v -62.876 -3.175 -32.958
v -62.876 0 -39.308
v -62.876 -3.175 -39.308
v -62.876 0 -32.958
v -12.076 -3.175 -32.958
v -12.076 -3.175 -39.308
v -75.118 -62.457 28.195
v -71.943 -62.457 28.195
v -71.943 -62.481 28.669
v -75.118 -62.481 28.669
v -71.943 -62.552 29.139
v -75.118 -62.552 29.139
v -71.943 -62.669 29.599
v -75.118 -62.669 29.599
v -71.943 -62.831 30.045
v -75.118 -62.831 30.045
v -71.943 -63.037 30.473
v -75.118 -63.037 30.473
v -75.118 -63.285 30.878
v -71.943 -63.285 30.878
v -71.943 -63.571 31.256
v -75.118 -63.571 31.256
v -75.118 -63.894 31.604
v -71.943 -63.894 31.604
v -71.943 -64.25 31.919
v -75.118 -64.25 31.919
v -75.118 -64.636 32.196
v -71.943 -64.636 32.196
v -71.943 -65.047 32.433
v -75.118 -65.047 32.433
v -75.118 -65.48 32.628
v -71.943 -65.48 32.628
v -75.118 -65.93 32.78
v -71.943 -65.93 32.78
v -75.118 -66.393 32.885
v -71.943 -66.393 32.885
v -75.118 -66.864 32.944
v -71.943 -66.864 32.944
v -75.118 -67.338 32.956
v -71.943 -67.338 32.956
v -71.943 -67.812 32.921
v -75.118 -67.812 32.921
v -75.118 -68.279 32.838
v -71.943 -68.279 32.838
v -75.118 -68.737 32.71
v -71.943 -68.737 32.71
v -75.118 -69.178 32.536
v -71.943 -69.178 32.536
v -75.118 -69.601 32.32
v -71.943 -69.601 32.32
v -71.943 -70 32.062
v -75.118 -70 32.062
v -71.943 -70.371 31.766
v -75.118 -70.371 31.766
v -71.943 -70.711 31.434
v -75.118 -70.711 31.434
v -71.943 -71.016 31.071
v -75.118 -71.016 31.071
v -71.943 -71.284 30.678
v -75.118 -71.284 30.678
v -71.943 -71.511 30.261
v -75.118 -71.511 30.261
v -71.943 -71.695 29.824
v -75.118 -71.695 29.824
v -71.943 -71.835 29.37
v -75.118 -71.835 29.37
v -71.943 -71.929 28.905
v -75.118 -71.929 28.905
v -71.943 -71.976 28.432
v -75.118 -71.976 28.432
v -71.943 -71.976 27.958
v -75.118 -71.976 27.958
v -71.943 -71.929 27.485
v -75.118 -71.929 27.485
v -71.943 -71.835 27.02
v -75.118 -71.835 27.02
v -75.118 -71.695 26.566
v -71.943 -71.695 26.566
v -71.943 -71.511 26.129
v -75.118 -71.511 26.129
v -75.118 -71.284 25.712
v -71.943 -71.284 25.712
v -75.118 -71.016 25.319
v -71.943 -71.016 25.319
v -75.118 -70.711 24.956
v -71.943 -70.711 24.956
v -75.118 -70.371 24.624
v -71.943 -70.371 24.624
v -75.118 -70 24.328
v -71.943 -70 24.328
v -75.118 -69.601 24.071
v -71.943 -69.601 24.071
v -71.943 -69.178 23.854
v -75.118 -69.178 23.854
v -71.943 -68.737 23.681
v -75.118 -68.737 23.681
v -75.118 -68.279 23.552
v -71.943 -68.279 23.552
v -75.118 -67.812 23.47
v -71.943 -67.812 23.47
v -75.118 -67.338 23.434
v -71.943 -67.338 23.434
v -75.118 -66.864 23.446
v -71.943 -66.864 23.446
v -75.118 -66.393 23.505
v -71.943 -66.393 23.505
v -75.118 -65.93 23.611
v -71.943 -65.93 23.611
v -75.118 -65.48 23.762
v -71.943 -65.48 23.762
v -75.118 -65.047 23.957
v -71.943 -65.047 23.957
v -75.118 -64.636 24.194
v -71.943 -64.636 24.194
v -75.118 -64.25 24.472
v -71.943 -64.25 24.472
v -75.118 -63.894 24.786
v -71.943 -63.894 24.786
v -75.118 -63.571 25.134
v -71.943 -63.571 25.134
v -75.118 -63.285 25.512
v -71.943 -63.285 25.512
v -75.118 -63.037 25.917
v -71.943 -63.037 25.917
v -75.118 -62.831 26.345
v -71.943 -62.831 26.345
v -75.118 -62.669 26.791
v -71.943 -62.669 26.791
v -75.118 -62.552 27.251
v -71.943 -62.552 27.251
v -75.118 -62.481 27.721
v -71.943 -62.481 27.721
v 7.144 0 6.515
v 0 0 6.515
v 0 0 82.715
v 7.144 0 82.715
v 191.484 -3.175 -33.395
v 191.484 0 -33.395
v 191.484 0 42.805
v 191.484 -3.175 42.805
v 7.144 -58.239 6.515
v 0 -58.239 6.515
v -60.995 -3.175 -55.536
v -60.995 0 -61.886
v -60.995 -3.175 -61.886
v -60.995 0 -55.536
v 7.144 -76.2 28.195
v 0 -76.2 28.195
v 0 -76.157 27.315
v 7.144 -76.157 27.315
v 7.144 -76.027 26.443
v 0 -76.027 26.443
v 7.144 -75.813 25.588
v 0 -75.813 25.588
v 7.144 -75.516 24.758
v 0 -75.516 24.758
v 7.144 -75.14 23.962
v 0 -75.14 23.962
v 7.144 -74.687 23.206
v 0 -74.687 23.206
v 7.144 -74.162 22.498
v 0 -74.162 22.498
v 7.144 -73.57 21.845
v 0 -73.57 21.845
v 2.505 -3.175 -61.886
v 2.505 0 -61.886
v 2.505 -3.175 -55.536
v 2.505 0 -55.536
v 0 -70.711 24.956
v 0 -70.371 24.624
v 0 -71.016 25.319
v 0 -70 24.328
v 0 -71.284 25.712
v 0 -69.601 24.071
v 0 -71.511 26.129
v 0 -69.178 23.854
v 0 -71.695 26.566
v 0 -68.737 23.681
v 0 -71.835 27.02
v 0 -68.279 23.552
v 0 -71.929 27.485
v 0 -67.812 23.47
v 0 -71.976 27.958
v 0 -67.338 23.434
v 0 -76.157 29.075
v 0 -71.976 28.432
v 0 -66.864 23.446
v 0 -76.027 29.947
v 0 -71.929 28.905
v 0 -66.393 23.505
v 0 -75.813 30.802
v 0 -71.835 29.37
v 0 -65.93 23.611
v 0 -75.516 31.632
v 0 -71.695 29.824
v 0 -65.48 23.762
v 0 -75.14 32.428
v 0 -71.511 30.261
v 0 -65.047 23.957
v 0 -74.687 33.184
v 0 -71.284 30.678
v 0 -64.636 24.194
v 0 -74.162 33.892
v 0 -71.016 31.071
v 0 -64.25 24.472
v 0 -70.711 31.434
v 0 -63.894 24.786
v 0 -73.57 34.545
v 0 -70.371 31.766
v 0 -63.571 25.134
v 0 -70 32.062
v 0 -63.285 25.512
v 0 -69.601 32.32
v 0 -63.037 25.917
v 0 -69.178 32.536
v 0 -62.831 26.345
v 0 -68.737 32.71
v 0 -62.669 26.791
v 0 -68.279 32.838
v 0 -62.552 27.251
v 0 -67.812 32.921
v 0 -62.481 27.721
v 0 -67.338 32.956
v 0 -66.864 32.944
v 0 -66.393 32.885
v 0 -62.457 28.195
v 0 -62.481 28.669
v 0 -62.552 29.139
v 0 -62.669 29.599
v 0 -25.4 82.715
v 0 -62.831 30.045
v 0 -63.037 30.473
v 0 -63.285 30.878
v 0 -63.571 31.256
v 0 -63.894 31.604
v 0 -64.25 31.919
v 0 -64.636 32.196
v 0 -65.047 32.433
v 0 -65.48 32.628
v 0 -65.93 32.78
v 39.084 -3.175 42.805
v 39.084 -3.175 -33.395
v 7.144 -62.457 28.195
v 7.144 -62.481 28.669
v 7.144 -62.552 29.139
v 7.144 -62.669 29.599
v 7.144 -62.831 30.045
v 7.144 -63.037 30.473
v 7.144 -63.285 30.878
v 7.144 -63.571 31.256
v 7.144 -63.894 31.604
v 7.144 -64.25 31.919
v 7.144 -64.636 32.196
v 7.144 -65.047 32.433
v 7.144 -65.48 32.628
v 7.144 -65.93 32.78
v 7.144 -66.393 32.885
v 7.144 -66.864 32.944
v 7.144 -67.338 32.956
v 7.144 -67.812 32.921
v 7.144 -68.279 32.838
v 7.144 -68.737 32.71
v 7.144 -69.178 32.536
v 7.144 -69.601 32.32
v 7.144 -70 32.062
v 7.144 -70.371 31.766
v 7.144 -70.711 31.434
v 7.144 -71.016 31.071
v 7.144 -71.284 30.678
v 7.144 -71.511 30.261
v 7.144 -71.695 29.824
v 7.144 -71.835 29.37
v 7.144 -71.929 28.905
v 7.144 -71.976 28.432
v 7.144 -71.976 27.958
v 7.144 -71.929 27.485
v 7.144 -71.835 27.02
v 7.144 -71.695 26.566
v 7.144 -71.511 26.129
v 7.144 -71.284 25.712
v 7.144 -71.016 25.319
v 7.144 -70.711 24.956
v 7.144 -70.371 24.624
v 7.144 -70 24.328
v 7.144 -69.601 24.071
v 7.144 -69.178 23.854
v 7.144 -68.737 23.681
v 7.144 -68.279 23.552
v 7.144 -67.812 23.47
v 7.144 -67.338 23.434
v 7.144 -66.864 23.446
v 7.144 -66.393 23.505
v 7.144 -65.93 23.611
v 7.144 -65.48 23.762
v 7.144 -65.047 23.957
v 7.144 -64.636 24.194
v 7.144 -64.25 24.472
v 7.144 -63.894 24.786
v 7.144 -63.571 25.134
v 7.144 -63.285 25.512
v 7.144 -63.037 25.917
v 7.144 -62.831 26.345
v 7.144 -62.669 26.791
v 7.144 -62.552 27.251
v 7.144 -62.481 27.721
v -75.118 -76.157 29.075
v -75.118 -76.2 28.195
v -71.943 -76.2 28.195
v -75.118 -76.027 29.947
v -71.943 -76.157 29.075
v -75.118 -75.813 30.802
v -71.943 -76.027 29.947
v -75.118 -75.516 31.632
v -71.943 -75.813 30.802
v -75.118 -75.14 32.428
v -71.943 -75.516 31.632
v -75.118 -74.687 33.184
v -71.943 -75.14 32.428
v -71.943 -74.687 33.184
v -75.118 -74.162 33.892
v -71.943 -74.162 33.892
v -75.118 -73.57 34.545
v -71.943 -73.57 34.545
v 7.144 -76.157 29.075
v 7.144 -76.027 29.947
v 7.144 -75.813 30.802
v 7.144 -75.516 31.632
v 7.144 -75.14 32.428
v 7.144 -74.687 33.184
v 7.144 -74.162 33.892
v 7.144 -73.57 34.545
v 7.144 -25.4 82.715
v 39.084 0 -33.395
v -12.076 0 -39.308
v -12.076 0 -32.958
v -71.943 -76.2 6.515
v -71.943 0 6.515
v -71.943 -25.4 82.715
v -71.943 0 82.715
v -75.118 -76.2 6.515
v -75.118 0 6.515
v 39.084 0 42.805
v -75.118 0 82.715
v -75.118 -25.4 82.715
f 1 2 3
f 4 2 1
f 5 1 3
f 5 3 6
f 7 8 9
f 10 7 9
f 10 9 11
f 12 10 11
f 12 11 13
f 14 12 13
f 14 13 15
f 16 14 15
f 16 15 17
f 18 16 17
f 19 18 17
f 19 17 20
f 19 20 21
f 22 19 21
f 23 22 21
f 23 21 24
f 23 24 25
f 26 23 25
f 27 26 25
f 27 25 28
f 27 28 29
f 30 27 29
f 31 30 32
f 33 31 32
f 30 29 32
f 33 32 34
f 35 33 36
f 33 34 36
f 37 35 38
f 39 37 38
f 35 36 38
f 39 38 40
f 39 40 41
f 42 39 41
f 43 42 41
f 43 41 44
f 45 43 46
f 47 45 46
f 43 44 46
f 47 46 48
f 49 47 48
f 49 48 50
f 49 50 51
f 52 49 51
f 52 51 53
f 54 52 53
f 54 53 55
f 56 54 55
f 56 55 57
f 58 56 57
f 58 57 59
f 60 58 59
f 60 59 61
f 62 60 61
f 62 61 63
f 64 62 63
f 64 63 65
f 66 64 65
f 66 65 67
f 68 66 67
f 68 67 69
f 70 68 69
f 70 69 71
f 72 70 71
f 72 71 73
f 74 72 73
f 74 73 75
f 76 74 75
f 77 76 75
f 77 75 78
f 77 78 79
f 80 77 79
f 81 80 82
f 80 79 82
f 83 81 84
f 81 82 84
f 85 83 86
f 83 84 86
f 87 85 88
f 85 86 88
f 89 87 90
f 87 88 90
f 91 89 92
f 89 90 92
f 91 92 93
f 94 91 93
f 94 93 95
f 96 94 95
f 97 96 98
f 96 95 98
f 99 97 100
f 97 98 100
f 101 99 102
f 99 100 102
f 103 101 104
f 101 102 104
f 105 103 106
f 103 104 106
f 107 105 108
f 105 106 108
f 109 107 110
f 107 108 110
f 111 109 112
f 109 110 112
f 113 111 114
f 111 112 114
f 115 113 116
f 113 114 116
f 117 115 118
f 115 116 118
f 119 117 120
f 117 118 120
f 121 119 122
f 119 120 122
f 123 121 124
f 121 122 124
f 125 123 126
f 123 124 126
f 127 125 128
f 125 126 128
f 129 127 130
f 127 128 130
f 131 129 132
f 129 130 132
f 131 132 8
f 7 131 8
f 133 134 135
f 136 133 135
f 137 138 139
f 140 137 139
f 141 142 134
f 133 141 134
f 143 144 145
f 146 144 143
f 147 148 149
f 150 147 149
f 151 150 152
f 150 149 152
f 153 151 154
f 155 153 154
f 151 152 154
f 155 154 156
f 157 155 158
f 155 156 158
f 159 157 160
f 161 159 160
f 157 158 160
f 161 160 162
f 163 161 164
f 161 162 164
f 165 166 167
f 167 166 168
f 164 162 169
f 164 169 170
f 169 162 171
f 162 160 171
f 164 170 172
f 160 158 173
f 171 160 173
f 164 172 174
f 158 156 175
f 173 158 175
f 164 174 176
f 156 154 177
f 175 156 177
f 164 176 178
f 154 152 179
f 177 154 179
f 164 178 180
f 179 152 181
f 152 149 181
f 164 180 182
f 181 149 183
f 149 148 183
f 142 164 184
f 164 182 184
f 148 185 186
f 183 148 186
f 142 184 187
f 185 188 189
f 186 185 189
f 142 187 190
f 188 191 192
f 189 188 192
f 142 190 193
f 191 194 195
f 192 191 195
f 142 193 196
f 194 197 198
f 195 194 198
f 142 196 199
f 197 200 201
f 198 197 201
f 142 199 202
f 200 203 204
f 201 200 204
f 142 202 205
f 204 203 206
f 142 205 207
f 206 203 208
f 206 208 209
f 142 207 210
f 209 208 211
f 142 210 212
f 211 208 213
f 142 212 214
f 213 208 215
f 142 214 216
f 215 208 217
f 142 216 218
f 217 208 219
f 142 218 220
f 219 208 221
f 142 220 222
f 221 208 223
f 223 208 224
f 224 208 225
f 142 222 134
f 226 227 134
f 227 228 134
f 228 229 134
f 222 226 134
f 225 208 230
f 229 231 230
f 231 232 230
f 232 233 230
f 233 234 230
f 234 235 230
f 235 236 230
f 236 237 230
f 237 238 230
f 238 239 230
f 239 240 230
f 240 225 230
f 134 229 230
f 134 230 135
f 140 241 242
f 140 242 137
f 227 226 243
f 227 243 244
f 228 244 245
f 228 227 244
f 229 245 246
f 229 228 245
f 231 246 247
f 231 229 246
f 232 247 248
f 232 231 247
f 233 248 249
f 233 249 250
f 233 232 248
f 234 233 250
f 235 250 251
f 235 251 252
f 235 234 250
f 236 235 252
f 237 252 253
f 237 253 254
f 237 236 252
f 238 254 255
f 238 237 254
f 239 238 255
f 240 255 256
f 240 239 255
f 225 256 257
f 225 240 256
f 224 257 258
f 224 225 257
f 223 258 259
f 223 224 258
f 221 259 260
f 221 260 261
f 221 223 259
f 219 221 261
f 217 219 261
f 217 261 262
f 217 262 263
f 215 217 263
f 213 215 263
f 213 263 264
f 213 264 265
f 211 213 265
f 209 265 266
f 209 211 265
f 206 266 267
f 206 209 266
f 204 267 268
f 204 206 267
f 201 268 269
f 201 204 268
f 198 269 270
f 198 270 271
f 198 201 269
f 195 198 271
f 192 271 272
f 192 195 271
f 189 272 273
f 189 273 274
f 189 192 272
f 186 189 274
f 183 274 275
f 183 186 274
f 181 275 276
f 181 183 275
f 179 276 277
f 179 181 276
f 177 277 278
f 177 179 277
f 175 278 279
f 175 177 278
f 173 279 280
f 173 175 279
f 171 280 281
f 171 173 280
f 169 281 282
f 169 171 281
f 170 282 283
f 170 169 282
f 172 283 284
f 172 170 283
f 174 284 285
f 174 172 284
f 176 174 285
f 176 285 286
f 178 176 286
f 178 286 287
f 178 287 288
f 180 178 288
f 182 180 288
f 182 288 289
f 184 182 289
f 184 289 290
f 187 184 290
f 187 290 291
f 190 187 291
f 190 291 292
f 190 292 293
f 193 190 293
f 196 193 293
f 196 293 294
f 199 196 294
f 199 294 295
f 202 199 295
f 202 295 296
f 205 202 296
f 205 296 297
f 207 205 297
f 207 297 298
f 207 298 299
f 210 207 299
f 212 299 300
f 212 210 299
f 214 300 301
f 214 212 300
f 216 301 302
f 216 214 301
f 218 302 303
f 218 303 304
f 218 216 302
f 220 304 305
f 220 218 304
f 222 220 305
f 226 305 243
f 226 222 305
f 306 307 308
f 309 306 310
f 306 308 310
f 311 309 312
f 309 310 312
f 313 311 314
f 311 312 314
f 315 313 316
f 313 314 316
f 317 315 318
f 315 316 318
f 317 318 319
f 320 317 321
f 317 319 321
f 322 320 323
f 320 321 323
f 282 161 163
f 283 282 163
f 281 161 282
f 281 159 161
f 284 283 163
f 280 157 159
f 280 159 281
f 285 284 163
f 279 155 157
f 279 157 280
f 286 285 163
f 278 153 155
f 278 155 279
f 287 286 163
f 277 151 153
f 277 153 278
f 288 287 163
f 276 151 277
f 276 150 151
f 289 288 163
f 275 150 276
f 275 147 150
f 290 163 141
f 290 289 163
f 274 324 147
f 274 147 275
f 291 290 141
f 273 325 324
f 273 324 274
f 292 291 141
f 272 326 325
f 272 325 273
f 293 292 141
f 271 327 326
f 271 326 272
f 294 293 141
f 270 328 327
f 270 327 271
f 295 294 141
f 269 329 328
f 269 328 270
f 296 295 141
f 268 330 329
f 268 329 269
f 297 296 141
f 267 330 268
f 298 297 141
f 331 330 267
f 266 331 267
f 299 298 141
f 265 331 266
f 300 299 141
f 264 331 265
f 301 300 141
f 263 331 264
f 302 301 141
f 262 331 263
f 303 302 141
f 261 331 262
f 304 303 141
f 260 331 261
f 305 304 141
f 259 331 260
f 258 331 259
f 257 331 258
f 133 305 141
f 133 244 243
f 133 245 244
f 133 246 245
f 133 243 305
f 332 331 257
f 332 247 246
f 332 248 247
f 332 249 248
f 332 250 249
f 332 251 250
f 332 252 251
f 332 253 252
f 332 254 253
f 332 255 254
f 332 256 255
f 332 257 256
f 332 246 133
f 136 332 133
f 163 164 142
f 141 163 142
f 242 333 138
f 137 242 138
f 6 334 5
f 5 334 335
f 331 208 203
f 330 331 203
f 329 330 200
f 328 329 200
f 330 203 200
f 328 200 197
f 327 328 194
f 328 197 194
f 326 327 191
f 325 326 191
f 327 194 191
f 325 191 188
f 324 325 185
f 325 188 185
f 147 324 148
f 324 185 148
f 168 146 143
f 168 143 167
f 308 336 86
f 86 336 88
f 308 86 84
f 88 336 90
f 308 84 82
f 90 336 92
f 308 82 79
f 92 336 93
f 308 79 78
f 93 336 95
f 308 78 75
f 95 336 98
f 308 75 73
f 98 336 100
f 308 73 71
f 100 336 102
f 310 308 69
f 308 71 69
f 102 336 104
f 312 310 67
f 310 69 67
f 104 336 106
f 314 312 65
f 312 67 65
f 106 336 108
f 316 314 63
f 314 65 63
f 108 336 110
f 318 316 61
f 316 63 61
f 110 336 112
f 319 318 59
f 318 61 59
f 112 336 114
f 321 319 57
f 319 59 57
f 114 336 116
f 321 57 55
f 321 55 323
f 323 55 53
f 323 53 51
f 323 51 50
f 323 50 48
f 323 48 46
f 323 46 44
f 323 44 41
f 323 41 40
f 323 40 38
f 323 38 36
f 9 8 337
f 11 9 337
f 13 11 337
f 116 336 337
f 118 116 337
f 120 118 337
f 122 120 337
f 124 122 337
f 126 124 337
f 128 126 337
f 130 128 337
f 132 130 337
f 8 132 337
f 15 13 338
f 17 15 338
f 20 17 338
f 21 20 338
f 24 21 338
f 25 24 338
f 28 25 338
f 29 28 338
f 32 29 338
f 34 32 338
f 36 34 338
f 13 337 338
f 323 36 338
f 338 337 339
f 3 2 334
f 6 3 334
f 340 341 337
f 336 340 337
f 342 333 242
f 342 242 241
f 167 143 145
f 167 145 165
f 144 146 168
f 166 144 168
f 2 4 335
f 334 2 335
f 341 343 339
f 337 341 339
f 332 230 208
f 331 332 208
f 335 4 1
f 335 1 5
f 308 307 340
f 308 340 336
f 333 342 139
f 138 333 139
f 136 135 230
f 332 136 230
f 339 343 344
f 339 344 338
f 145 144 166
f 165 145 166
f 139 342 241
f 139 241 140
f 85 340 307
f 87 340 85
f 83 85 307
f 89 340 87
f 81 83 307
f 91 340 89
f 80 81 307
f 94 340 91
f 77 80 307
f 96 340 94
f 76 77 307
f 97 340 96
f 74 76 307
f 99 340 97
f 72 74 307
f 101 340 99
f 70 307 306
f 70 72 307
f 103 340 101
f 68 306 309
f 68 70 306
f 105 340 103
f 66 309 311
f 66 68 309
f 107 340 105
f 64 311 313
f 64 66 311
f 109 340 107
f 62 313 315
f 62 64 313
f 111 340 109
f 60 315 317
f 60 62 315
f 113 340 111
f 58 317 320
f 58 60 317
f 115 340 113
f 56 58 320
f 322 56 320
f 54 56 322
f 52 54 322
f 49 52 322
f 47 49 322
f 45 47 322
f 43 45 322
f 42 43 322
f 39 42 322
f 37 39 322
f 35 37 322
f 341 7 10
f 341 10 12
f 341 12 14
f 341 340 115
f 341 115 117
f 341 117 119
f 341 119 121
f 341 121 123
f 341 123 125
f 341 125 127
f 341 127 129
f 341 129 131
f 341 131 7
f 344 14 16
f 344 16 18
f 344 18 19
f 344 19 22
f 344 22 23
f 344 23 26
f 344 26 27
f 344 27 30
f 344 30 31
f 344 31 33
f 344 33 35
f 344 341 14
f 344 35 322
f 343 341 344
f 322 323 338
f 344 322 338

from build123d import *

# Parameters (mm, degrees)
F0_W     = 3.175
F0_H     = 76.2
F1_DEPTH = 76.2
F2_R     = 4.7625
F3_DEPTH = 3.176
F4_R     = 4.7625
F5_DEPTH = 7.14375
F6_W     = 50.8
F6_H     = 6.35
F7_DEPTH = 3.175
F6_W_2   = 63.5
F8_W     = 152.4
F8_H     = 76.2
F9_DEPTH = 3.175


with BuildPart() as f1:
    # F0 (on Front) → F1 (new body)
    with BuildSketch(Plane.XZ):
        with Locations((-73.5300647497, 44.6148249376)):
            Rectangle(F0_W, F0_H)
    extrude(amount=F1_DEPTH)

    # F2 (on face) → F3 (cut, through all)
    with BuildSketch(Plane.YZ.offset(-71.9425647497)):
        with Locations((-67.2197438789, 28.1950810586)):
            Circle(F2_R)
        Polygon((-25.4, 82.7148249376), (-76.2, 82.7148249376), (-76.2, 31.9148249376), (-73.5697438639, 34.5450810737), align=None)
        with BuildLine():
            Line((-73.5697438639, 34.5450810737), (-76.2, 31.9148249376))
            Line((-76.2, 31.9148249376), (-76.2, 28.1950810586))
            ThreePointArc((-76.2, 28.1950810586), (-75.5164187018, 31.6316763044), (-73.5697438639, 34.5450810737))
        make_face()
    extrude(amount=-F3_DEPTH, mode=Mode.SUBTRACT)


with BuildPart() as f5:
    # F4 (on Right) → F5 (new body)
    with BuildSketch(Plane.YZ):
        with BuildLine():
            Line((-25.4, 82.7148249376), (-73.5697438789, 34.5450810586))
            ThreePointArc((-73.5697438789, 34.5450810586), (-63.783148643, 36.4917558856), (-58.2394877579, 28.1950810586))
            ThreePointArc((-58.2394877579, 28.1950810586), (-63.783148643, 19.8984062317), (-73.5697438789, 21.8450810586))
            Line((-73.5697438789, 21.8450810586), (-58.2394877579, 6.5148249376))
            Line((-58.2394877579, 6.5148249376), (0, 6.5148249376))
            Line((0, 6.5148249376), (0, 82.7148249376))
            Line((0, 82.7148249376), (-25.4, 82.7148249376))
        make_face()
        with BuildLine():
            ThreePointArc((-58.2394877579, 28.1950810586), (-63.783148643, 36.4917558856), (-73.5697438789, 34.5450810586))
            ThreePointArc((-73.5697438789, 34.5450810586), (-75.5164187059, 31.6316762946), (-76.2, 28.1950810586))
            ThreePointArc((-76.2, 28.1950810586), (-75.5164187059, 24.7584858227), (-73.5697438789, 21.8450810586))
            ThreePointArc((-73.5697438789, 21.8450810586), (-63.783148643, 19.8984062317), (-58.2394877579, 28.1950810586))
        make_face()
        with Locations((-67.2197438789, 28.1950810586)):
            Circle(F4_R, mode=Mode.SUBTRACT)
    extrude(amount=F5_DEPTH)


with BuildPart() as f7:
    # F6 (on Front) → F7 (new body)
    with BuildSketch(Plane.XZ):
        with Locations((-37.4763381527, -36.1332869839)):
            Rectangle(F6_W, F6_H)
    extrude(amount=F7_DEPTH)


with BuildPart() as f7b:
    # F6 (on Front) → F7, piece 2 (new body)
    with BuildSketch(Plane.XZ):
        with Locations((-29.2448589822, -58.7110662023)):
            Rectangle(F6_W_2, F6_H)
    extrude(amount=F7_DEPTH)


with BuildPart() as f9:
    # F8 (on Front) → F9 (new body)
    with BuildSketch(Plane.XZ):
        with Locations((115.2841262519, 4.7049395782)):
            Rectangle(F8_W, F8_H)
    extrude(amount=F9_DEPTH)


solid = Compound([f1.part, f5.part, f7.part, f7b.part, f9.part])
